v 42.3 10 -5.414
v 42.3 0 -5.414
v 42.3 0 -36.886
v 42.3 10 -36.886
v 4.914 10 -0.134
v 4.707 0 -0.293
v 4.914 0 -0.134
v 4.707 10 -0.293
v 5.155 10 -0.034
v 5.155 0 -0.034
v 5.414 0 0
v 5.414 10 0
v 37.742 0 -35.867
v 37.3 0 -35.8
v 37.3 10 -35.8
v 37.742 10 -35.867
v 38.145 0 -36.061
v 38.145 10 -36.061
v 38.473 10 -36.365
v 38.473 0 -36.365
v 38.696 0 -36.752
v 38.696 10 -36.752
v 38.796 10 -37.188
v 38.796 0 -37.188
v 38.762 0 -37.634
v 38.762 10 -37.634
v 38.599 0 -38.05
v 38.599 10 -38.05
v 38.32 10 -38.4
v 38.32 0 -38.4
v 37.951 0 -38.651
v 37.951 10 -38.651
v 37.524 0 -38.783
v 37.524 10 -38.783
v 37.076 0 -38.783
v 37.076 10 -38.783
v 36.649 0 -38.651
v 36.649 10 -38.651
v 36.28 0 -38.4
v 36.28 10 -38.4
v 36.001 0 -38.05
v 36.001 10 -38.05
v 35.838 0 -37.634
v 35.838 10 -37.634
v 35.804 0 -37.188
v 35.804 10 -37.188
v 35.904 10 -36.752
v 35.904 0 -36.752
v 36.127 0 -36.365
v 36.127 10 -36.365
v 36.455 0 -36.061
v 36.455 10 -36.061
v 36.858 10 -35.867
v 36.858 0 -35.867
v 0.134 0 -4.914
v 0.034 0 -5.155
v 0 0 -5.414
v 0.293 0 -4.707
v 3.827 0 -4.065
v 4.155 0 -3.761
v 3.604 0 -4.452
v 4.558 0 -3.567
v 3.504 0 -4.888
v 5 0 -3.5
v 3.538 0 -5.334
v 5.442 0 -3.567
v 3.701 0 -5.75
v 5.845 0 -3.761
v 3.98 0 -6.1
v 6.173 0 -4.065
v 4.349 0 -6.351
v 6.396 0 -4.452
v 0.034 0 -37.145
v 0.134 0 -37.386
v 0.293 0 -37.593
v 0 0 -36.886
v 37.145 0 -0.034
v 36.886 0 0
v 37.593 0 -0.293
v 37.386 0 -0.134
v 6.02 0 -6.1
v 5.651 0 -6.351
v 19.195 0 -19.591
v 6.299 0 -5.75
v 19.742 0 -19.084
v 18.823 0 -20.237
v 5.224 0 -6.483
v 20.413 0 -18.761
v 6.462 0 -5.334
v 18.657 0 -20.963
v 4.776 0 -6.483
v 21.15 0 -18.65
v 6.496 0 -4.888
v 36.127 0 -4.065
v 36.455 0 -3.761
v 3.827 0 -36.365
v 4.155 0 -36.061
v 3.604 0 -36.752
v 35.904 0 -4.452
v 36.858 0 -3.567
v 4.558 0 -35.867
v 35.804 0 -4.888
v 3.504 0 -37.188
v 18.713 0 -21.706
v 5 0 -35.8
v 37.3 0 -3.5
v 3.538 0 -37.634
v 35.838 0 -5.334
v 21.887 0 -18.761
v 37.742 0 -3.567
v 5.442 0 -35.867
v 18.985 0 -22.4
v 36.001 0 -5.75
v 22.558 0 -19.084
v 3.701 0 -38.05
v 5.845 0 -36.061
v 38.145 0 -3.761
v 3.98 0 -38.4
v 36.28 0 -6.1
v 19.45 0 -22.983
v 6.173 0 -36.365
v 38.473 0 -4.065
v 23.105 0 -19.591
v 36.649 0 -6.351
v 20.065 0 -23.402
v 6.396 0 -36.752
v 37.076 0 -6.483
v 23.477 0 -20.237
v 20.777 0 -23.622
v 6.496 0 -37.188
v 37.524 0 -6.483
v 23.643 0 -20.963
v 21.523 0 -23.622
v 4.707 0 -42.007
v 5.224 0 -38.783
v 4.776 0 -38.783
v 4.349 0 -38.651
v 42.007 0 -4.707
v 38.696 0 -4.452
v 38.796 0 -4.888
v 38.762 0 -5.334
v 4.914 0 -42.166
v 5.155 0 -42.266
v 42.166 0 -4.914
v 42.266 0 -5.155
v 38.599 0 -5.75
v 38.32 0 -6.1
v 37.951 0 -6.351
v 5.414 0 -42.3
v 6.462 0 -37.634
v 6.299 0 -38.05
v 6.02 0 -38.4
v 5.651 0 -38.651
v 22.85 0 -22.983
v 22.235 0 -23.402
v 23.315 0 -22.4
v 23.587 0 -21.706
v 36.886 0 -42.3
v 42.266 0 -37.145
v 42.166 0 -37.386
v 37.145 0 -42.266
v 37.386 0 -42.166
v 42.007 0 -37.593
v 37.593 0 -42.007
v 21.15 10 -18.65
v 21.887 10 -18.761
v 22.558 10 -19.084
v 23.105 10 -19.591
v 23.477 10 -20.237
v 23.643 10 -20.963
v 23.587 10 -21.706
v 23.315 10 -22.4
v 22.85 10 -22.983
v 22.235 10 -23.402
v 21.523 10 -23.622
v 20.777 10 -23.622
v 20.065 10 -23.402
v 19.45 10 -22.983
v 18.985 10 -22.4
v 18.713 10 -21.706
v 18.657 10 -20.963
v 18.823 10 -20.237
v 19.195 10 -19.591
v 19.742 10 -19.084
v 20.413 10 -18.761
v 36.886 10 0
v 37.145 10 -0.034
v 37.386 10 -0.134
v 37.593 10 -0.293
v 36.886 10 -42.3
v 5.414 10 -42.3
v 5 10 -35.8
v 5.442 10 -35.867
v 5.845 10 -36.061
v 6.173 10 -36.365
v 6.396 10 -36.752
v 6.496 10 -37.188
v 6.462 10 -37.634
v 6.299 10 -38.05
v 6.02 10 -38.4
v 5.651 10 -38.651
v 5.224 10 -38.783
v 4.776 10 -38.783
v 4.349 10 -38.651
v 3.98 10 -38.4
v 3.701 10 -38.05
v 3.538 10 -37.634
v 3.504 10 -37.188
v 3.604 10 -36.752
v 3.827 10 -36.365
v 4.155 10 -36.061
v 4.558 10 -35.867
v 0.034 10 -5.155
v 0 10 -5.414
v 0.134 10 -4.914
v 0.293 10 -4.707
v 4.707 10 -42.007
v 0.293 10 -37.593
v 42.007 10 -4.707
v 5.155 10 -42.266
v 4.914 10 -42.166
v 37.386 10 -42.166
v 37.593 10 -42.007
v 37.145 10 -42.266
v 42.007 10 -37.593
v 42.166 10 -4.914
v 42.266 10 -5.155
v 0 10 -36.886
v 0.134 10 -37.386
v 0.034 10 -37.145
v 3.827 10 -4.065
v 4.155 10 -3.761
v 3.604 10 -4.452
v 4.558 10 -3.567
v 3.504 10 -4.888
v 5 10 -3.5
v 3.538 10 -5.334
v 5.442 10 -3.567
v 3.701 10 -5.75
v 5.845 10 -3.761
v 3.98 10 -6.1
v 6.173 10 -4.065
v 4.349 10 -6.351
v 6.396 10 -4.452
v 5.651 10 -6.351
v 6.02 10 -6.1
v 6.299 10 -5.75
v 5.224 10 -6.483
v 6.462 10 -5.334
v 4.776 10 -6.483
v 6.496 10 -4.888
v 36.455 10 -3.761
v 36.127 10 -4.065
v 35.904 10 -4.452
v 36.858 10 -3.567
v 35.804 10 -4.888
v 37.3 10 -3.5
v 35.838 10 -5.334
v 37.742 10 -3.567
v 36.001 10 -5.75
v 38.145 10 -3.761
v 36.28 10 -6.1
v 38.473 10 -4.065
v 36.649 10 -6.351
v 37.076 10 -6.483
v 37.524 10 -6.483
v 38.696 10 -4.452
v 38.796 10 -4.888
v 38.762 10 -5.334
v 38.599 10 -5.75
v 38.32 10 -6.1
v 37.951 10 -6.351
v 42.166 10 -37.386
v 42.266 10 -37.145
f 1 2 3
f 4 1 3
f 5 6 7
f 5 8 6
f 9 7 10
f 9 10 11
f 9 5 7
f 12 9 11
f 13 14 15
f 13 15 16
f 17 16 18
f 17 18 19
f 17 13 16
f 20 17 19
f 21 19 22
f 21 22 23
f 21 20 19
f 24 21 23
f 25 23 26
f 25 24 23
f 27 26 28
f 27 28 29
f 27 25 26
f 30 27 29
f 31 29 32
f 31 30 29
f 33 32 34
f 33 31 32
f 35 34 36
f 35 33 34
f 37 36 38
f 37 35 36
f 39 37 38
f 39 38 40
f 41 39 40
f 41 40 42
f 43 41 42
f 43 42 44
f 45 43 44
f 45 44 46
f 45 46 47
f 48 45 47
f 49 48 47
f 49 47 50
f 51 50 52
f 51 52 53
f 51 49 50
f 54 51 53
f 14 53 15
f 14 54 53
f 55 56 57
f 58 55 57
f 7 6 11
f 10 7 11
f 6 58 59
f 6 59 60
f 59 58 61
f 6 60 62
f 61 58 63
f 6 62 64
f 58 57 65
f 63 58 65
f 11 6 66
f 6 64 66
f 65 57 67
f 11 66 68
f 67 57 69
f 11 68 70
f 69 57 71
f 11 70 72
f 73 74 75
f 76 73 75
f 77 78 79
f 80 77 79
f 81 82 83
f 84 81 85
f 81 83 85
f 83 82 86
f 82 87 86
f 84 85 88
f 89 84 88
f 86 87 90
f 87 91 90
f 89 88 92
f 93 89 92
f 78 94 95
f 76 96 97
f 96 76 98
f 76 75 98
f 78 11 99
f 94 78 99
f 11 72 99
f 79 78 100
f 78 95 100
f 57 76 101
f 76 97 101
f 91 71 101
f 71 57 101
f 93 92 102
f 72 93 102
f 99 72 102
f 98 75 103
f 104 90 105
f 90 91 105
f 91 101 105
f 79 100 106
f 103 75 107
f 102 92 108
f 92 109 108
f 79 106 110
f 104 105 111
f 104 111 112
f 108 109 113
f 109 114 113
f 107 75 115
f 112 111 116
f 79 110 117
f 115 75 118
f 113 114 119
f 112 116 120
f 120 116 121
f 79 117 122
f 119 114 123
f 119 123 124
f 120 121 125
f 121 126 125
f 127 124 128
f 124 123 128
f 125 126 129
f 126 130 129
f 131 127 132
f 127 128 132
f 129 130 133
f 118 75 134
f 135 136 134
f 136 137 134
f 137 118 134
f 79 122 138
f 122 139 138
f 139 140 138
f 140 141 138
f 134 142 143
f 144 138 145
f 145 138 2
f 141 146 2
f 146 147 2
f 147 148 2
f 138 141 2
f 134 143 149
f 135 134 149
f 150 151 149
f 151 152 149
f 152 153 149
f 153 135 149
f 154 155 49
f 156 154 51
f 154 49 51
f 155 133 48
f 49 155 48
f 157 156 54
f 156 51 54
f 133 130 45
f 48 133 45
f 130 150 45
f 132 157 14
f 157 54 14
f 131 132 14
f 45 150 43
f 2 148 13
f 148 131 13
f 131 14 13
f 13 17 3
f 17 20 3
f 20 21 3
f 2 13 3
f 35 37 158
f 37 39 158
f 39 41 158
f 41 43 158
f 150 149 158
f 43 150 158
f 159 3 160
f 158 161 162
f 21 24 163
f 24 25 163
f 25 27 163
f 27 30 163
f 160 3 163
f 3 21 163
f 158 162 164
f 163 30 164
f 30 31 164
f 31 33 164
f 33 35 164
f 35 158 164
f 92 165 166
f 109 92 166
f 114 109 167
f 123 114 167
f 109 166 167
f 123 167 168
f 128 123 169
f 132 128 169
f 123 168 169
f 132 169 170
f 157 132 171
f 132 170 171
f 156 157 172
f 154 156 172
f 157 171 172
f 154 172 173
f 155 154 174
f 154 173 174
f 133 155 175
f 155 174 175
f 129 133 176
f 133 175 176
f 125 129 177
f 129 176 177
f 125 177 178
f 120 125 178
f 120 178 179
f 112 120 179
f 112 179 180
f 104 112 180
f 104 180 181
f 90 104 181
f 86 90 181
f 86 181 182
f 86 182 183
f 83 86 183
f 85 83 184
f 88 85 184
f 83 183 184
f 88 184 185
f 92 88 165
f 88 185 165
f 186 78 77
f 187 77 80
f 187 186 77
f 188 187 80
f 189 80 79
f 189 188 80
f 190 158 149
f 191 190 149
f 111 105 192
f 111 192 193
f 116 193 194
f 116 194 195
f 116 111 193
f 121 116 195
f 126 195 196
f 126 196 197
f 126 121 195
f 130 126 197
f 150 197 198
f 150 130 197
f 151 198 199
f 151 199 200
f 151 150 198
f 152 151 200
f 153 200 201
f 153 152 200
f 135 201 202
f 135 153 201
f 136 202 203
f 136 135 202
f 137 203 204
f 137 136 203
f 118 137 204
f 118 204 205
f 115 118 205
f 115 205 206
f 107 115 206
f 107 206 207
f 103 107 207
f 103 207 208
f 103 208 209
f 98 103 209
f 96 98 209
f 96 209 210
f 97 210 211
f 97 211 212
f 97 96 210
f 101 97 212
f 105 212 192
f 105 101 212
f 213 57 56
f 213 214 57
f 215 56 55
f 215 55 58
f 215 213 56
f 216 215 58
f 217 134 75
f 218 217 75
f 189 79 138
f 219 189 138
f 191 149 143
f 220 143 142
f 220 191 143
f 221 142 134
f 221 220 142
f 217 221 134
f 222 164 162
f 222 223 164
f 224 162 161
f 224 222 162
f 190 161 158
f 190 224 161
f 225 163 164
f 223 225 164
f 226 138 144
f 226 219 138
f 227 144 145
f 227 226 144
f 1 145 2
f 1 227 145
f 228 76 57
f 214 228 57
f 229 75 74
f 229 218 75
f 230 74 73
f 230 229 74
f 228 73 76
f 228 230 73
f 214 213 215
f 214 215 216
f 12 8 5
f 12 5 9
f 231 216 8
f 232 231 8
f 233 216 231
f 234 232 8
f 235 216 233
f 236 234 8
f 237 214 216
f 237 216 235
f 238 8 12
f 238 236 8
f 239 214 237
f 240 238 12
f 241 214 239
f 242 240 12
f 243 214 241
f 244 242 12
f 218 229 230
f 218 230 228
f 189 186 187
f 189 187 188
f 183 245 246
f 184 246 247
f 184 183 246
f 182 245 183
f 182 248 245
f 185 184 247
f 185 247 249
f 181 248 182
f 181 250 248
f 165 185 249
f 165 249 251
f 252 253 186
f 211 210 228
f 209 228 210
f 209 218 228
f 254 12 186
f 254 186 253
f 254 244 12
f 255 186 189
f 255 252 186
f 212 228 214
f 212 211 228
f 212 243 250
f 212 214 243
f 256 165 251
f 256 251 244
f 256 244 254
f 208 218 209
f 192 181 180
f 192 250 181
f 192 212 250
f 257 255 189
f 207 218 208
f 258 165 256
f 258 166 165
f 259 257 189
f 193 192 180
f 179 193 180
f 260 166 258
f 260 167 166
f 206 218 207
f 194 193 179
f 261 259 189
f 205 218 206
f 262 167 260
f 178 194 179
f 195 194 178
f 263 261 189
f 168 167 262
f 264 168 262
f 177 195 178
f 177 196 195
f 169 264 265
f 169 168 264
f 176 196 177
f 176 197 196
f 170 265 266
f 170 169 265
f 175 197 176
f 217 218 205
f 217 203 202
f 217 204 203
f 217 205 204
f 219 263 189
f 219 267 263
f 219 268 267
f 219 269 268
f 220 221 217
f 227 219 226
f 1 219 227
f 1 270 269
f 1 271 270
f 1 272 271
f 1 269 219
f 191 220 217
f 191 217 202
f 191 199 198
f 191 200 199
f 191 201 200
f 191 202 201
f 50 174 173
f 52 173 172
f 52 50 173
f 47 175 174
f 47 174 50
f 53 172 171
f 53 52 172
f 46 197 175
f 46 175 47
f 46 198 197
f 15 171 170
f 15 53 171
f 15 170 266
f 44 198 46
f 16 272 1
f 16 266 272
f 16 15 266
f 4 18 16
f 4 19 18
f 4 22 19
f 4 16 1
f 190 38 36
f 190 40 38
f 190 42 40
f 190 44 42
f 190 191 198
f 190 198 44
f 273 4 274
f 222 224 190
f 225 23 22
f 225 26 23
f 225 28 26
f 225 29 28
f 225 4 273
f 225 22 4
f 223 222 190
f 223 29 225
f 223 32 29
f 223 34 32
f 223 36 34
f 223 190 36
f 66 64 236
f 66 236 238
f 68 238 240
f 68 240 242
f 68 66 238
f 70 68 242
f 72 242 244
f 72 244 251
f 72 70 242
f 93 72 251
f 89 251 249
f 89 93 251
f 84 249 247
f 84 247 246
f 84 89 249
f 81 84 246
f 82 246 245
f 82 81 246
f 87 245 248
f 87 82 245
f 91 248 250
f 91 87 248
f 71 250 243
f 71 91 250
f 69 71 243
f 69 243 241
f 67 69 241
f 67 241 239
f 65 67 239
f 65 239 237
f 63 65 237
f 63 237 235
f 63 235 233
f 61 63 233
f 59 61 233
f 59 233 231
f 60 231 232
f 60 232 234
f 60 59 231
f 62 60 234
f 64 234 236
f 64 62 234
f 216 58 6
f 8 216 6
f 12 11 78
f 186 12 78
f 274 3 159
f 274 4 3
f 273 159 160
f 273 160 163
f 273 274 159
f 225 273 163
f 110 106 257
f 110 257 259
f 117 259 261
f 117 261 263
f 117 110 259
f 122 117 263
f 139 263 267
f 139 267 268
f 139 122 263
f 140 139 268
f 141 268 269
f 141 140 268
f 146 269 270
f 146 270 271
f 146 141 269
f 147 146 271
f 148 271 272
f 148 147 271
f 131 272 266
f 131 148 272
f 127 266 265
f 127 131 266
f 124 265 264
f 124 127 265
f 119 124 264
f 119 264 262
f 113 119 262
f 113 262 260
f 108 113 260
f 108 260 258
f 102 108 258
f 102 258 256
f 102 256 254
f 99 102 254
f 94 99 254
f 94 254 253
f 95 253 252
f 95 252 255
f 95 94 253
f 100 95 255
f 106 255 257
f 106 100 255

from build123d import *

# Parameters (mm, degrees)
SKETCH1_R           = 1.5
BOSS_EXTRUDE1_DEPTH = 10
FILLET1_R           = 1
FILLET2_R           = 1
FILLET3_R           = 1
FILLET4_R           = 1
FILLET5_R           = 1
FILLET6_R           = 1
FILLET7_R           = 1
FILLET8_R           = 1
SKETCH2_R           = 2.5
CUT_EXTRUDE1_DEPTH  = 10


with BuildPart() as part:
    # Sketch1 → Boss-Extrude1 (new body)
    with BuildSketch(Plane(origin=(0, 0, 0), x_dir=(1, 0, 0), z_dir=(0, 1, 0))):
        Polygon((37.3, 42.3), (5, 42.3), (0, 37.3), (0, 5), (5, 0), (37.3, 0), (42.3, 5), (42.3, 37.3), align=None)
        with Locations(Location((5, 5, 0), (0, 0, 270))):
            Circle(SKETCH1_R, mode=Mode.SUBTRACT)
        with Locations(Location((37.3, 5, 0), (0, 0, 270))):
            Circle(SKETCH1_R, mode=Mode.SUBTRACT)
        with Locations(Location((5, 37.3, 0), (0, 0, 270))):
            Circle(SKETCH1_R, mode=Mode.SUBTRACT)
        with Locations(Location((37.3, 37.3, 0), (0, 0, 270))):
            Circle(SKETCH1_R, mode=Mode.SUBTRACT)
    extrude(amount=BOSS_EXTRUDE1_DEPTH)

    # Fillet1
    fillet1_edges = [part.edges().sort_by_distance(p)[0] for p in [
        (0, 5, -5),
    ]]
    fillet(fillet1_edges, radius=FILLET1_R)

    # Fillet2
    fillet2_edges = [part.edges().sort_by_distance(p)[0] for p in [
        (5, 5, 0),
    ]]
    fillet(fillet2_edges, radius=FILLET2_R)

    # Fillet3
    fillet3_edges = [part.edges().sort_by_distance(p)[0] for p in [
        (37.3, 5, 0),
    ]]
    fillet(fillet3_edges, radius=FILLET3_R)

    # Fillet4
    fillet4_edges = [part.edges().sort_by_distance(p)[0] for p in [
        (42.3, 5, -5),
    ]]
    fillet(fillet4_edges, radius=FILLET4_R)

    # Fillet5
    fillet5_edges = [part.edges().sort_by_distance(p)[0] for p in [
        (42.3, 5, -37.3),
    ]]
    fillet(fillet5_edges, radius=FILLET5_R)

    # Fillet6
    fillet6_edges = [part.edges().sort_by_distance(p)[0] for p in [
        (37.3, 5, -42.3),
    ]]
    fillet(fillet6_edges, radius=FILLET6_R)

    # Fillet7
    fillet7_edges = [part.edges().sort_by_distance(p)[0] for p in [
        (5, 5, -42.3),
    ]]
    fillet(fillet7_edges, radius=FILLET7_R)

    # Fillet8
    fillet8_edges = [part.edges().sort_by_distance(p)[0] for p in [
        (0, 5, -37.3),
    ]]
    fillet(fillet8_edges, radius=FILLET8_R)

    # Sketch2 → Cut-Extrude1 (cut)
    with BuildSketch(Plane(origin=(0, 10, 0), x_dir=(1, 0, 0), z_dir=(0, 1, 0))):
        with Locations(Location((21.15, 21.15, 0), (0, 0, 270))):
            Circle(SKETCH2_R)
    extrude(amount=-CUT_EXTRUDE1_DEPTH, mode=Mode.SUBTRACT)


solid = part.part
